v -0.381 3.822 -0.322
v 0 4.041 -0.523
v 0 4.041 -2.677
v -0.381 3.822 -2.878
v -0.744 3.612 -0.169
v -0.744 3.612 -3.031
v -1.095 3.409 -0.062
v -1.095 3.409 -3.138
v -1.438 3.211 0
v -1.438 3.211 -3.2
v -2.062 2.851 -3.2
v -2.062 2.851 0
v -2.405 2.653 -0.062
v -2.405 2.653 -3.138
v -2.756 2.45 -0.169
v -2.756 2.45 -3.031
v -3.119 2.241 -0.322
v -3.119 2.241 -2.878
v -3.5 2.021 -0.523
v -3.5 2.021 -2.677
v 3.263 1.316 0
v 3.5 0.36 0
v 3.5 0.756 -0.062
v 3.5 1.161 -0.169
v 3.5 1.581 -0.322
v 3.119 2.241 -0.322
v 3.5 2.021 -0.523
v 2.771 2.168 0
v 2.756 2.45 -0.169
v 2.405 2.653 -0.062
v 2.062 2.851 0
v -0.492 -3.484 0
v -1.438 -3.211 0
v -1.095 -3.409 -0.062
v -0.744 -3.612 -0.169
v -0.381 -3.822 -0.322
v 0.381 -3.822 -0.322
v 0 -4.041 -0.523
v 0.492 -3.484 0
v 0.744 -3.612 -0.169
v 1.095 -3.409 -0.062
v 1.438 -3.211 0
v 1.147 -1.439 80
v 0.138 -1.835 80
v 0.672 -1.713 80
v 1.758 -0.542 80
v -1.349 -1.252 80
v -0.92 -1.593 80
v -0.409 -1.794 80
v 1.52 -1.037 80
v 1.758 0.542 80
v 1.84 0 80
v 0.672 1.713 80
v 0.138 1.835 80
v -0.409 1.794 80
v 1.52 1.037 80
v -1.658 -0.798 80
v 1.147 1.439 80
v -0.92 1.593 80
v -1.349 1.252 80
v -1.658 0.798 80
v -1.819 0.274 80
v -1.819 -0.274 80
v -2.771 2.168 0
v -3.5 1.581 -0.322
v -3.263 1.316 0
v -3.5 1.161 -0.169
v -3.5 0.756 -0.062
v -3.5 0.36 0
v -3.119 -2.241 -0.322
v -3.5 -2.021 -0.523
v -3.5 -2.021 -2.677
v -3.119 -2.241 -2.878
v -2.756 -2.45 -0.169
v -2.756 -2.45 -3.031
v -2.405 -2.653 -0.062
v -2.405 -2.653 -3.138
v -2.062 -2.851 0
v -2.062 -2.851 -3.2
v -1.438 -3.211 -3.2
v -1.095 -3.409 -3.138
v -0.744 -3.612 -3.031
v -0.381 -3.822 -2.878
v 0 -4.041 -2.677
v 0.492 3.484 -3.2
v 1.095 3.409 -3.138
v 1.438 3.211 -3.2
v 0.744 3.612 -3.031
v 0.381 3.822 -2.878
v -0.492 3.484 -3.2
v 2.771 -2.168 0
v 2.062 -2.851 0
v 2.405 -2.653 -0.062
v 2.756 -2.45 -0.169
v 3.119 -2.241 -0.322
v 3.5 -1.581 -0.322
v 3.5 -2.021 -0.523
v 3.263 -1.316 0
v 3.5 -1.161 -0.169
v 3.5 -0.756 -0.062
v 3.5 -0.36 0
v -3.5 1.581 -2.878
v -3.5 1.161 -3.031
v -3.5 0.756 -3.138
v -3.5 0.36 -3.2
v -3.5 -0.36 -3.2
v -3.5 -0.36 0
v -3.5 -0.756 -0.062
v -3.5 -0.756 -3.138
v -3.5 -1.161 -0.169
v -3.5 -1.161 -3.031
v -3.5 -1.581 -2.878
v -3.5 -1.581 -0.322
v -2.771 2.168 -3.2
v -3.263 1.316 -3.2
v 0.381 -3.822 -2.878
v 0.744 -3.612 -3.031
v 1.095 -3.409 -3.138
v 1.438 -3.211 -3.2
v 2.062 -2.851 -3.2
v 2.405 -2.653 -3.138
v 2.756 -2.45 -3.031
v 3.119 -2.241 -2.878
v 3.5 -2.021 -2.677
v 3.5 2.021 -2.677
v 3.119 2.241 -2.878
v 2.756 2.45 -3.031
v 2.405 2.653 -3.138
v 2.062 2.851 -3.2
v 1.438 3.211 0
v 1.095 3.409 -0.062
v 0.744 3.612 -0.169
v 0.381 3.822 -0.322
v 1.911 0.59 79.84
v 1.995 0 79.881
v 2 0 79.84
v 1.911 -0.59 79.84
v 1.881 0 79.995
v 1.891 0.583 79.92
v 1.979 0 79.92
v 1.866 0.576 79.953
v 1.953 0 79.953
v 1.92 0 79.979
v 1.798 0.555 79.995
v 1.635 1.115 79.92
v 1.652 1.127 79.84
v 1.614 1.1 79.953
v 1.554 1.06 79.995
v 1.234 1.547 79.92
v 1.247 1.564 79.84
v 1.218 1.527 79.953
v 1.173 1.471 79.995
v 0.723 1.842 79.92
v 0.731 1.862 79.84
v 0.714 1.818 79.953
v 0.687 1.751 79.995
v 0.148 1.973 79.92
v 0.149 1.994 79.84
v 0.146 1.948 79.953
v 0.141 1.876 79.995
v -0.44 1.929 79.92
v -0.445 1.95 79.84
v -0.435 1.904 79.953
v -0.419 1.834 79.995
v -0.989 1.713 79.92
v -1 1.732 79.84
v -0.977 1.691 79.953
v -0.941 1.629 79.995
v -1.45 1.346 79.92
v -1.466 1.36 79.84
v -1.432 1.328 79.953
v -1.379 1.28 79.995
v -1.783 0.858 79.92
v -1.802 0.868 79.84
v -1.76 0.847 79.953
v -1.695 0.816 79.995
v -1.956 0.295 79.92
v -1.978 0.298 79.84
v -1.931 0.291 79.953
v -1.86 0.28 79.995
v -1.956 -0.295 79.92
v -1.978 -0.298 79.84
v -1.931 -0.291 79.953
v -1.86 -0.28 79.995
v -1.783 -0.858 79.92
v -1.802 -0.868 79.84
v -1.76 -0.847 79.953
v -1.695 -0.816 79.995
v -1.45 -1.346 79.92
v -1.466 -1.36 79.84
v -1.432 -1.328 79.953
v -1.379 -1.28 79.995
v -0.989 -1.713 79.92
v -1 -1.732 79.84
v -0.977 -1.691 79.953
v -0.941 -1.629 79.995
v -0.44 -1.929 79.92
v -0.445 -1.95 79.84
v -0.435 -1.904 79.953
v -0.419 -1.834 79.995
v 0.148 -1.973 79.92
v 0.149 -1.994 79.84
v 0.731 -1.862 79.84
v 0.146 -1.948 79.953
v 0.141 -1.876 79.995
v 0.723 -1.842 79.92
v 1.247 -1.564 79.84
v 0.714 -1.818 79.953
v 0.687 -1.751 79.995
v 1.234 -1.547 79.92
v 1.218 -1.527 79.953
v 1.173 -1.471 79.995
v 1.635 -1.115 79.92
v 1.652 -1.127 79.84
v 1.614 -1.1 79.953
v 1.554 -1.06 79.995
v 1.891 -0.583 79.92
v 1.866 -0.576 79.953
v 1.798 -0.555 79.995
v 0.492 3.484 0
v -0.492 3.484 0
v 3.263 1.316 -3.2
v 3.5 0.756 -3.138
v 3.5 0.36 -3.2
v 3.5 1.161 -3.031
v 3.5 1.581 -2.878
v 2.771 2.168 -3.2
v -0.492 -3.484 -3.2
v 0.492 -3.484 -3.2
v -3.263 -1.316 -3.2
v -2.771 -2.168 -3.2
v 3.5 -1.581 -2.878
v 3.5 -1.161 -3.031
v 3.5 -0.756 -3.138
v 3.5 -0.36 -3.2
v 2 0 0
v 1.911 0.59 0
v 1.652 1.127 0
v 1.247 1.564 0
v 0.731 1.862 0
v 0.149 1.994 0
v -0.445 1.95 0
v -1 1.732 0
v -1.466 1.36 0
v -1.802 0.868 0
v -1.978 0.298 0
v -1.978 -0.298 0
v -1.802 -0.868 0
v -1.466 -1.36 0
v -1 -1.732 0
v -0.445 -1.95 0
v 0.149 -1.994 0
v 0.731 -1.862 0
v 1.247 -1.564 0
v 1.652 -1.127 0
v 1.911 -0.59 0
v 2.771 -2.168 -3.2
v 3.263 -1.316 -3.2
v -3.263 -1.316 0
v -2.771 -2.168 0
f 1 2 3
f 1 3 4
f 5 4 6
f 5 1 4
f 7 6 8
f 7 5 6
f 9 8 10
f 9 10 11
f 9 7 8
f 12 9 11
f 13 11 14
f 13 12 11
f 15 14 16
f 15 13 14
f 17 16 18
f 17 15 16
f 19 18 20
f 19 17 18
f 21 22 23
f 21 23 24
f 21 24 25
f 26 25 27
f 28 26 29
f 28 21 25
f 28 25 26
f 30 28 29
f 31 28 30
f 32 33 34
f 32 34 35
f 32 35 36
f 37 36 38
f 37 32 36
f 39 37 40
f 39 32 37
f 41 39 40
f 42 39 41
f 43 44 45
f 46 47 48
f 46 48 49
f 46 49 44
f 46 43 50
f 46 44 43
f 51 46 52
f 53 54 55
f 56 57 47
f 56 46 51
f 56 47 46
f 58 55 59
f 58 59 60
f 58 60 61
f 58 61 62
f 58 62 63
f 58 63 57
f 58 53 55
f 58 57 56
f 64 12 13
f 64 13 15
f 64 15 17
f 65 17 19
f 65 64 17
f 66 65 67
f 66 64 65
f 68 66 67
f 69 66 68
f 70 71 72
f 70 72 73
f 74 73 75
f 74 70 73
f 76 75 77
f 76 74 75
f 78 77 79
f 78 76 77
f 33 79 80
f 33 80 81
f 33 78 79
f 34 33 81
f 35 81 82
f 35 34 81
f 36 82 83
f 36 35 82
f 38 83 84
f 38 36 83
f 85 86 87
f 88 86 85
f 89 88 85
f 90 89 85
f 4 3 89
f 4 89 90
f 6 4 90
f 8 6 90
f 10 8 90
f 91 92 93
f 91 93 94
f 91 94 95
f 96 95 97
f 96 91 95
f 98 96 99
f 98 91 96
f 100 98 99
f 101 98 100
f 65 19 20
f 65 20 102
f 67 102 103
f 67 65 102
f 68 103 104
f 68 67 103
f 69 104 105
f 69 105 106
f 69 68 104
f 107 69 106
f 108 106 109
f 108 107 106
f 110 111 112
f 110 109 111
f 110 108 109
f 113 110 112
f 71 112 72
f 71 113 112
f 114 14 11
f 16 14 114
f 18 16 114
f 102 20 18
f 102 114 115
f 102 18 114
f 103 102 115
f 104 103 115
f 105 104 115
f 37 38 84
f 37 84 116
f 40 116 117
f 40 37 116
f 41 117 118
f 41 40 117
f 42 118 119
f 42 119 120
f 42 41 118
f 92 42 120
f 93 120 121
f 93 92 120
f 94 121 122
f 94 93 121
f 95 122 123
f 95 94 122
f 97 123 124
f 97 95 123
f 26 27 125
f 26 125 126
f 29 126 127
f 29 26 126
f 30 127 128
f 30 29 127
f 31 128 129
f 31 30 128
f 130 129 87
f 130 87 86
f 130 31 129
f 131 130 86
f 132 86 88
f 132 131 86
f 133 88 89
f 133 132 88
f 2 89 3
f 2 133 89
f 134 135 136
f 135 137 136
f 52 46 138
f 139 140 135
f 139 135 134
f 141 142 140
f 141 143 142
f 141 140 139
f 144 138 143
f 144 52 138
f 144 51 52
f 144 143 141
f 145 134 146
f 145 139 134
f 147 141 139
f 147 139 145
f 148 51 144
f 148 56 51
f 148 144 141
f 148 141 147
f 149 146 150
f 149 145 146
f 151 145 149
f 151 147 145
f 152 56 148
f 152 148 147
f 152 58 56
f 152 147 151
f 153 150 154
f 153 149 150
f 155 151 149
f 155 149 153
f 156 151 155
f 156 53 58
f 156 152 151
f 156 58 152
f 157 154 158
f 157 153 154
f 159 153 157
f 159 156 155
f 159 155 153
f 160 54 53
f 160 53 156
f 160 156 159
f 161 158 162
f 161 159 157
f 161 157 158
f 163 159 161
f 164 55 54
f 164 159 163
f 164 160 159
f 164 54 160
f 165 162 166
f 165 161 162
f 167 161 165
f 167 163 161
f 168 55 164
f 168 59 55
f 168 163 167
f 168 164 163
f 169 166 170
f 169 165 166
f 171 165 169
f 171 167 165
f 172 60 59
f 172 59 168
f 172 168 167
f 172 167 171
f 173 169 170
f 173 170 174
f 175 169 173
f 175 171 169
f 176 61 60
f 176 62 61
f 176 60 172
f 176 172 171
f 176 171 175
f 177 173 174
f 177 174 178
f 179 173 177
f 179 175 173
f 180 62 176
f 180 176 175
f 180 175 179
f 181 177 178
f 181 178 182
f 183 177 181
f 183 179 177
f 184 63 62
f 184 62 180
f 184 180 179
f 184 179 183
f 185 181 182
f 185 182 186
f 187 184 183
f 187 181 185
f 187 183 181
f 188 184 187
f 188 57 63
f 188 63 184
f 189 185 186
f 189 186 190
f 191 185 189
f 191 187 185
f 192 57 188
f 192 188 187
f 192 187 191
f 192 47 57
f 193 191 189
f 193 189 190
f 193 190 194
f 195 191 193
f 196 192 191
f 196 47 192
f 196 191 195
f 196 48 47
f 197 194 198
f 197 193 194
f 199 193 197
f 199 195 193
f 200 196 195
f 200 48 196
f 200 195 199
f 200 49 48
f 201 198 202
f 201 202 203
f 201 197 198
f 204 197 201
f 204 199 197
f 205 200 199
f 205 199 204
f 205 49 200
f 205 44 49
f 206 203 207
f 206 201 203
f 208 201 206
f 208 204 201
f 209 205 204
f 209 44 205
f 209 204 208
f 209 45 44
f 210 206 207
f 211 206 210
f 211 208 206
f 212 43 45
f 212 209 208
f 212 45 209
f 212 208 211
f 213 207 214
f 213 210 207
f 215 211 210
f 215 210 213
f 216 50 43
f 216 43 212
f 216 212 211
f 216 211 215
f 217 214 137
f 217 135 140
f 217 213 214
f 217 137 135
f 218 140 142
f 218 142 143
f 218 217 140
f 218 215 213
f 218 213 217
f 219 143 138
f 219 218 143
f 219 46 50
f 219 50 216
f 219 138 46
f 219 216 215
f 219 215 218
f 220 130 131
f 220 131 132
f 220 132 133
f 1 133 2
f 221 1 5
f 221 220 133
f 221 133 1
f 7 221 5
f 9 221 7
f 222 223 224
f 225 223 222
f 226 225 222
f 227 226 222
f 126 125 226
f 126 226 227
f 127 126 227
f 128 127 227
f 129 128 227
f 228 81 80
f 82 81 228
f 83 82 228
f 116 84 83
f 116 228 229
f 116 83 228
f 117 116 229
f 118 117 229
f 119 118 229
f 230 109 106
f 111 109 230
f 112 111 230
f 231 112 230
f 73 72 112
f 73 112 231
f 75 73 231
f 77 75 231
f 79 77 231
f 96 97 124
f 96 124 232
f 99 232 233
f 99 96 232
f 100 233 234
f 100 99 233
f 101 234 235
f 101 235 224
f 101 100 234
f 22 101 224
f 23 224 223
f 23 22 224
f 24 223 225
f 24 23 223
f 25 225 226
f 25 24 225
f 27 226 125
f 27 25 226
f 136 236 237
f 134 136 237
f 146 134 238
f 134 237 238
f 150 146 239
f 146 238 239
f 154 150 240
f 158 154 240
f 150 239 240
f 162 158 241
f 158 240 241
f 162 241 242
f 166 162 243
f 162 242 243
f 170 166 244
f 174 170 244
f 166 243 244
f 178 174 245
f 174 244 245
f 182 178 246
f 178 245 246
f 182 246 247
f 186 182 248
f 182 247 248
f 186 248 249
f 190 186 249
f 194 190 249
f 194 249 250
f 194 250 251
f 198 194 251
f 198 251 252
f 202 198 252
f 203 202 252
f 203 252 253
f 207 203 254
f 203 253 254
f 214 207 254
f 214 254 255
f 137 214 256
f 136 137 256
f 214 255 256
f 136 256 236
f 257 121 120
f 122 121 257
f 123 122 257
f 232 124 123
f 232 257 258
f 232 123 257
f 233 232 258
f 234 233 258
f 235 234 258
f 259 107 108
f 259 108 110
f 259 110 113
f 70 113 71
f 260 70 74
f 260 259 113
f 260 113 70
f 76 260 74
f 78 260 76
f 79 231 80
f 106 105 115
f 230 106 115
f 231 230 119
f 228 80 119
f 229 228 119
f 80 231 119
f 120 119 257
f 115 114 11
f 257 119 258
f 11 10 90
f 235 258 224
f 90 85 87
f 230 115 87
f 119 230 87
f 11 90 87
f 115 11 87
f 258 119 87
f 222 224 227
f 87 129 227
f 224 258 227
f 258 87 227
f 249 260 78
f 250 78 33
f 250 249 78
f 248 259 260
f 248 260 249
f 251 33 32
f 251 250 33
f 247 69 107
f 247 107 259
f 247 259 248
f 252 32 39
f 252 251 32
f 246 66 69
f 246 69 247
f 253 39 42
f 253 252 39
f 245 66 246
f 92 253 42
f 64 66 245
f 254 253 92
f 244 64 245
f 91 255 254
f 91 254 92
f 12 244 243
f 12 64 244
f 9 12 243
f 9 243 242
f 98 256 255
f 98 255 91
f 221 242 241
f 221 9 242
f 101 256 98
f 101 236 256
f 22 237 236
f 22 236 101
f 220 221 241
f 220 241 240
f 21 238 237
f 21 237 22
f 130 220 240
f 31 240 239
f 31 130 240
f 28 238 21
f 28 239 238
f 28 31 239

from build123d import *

# Parameters (mm, degrees)
EXTRUDE_1_DEPTH = 3.2
SKETCH_2_R      = 2
EXTRUDE_2_DEPTH = 80
FILLET_1_R      = 0.16


with BuildPart() as part:
    # 草图1 → 凸台-拉伸1 (new body)
    with BuildSketch(Plane.XY):
        Polygon((0, 4.041451884), (-3.5, 2.020725942), (-3.5, -2.020725942), (0, -4.041451884), (3.5, -2.020725942), (3.5, 2.020725942), align=None)
    extrude(amount=-EXTRUDE_1_DEPTH)

    # 草图3 → 切除-旋转1 (revolve, cut)
    with BuildSketch(Plane(origin=(0, 0, 0), x_dir=(0, 0, -1), z_dir=(1, 0, 0))):
        Polygon((0.523, 4.041451884), (0, 3.518451884), (0, 4.041451884), align=None)
        Polygon((3.2, 4.041451884), (3.2, 3.518451884), (2.677, 4.041451884), align=None)
    revolve(axis=Axis((0, 0, 0), (0, 0, 1)), mode=Mode.SUBTRACT)

    # 草图2 → 凸台-拉伸2 (add)
    with BuildSketch(Plane.XY):
        Circle(SKETCH_2_R)
    extrude(amount=EXTRUDE_2_DEPTH)

    # 圆角1
    fillet_1_edges = [part.edges().sort_by_distance(p)[0] for p in [
        (-2, 0, 80),
    ]]
    fillet(fillet_1_edges, radius=FILLET_1_R)


solid = part.part
